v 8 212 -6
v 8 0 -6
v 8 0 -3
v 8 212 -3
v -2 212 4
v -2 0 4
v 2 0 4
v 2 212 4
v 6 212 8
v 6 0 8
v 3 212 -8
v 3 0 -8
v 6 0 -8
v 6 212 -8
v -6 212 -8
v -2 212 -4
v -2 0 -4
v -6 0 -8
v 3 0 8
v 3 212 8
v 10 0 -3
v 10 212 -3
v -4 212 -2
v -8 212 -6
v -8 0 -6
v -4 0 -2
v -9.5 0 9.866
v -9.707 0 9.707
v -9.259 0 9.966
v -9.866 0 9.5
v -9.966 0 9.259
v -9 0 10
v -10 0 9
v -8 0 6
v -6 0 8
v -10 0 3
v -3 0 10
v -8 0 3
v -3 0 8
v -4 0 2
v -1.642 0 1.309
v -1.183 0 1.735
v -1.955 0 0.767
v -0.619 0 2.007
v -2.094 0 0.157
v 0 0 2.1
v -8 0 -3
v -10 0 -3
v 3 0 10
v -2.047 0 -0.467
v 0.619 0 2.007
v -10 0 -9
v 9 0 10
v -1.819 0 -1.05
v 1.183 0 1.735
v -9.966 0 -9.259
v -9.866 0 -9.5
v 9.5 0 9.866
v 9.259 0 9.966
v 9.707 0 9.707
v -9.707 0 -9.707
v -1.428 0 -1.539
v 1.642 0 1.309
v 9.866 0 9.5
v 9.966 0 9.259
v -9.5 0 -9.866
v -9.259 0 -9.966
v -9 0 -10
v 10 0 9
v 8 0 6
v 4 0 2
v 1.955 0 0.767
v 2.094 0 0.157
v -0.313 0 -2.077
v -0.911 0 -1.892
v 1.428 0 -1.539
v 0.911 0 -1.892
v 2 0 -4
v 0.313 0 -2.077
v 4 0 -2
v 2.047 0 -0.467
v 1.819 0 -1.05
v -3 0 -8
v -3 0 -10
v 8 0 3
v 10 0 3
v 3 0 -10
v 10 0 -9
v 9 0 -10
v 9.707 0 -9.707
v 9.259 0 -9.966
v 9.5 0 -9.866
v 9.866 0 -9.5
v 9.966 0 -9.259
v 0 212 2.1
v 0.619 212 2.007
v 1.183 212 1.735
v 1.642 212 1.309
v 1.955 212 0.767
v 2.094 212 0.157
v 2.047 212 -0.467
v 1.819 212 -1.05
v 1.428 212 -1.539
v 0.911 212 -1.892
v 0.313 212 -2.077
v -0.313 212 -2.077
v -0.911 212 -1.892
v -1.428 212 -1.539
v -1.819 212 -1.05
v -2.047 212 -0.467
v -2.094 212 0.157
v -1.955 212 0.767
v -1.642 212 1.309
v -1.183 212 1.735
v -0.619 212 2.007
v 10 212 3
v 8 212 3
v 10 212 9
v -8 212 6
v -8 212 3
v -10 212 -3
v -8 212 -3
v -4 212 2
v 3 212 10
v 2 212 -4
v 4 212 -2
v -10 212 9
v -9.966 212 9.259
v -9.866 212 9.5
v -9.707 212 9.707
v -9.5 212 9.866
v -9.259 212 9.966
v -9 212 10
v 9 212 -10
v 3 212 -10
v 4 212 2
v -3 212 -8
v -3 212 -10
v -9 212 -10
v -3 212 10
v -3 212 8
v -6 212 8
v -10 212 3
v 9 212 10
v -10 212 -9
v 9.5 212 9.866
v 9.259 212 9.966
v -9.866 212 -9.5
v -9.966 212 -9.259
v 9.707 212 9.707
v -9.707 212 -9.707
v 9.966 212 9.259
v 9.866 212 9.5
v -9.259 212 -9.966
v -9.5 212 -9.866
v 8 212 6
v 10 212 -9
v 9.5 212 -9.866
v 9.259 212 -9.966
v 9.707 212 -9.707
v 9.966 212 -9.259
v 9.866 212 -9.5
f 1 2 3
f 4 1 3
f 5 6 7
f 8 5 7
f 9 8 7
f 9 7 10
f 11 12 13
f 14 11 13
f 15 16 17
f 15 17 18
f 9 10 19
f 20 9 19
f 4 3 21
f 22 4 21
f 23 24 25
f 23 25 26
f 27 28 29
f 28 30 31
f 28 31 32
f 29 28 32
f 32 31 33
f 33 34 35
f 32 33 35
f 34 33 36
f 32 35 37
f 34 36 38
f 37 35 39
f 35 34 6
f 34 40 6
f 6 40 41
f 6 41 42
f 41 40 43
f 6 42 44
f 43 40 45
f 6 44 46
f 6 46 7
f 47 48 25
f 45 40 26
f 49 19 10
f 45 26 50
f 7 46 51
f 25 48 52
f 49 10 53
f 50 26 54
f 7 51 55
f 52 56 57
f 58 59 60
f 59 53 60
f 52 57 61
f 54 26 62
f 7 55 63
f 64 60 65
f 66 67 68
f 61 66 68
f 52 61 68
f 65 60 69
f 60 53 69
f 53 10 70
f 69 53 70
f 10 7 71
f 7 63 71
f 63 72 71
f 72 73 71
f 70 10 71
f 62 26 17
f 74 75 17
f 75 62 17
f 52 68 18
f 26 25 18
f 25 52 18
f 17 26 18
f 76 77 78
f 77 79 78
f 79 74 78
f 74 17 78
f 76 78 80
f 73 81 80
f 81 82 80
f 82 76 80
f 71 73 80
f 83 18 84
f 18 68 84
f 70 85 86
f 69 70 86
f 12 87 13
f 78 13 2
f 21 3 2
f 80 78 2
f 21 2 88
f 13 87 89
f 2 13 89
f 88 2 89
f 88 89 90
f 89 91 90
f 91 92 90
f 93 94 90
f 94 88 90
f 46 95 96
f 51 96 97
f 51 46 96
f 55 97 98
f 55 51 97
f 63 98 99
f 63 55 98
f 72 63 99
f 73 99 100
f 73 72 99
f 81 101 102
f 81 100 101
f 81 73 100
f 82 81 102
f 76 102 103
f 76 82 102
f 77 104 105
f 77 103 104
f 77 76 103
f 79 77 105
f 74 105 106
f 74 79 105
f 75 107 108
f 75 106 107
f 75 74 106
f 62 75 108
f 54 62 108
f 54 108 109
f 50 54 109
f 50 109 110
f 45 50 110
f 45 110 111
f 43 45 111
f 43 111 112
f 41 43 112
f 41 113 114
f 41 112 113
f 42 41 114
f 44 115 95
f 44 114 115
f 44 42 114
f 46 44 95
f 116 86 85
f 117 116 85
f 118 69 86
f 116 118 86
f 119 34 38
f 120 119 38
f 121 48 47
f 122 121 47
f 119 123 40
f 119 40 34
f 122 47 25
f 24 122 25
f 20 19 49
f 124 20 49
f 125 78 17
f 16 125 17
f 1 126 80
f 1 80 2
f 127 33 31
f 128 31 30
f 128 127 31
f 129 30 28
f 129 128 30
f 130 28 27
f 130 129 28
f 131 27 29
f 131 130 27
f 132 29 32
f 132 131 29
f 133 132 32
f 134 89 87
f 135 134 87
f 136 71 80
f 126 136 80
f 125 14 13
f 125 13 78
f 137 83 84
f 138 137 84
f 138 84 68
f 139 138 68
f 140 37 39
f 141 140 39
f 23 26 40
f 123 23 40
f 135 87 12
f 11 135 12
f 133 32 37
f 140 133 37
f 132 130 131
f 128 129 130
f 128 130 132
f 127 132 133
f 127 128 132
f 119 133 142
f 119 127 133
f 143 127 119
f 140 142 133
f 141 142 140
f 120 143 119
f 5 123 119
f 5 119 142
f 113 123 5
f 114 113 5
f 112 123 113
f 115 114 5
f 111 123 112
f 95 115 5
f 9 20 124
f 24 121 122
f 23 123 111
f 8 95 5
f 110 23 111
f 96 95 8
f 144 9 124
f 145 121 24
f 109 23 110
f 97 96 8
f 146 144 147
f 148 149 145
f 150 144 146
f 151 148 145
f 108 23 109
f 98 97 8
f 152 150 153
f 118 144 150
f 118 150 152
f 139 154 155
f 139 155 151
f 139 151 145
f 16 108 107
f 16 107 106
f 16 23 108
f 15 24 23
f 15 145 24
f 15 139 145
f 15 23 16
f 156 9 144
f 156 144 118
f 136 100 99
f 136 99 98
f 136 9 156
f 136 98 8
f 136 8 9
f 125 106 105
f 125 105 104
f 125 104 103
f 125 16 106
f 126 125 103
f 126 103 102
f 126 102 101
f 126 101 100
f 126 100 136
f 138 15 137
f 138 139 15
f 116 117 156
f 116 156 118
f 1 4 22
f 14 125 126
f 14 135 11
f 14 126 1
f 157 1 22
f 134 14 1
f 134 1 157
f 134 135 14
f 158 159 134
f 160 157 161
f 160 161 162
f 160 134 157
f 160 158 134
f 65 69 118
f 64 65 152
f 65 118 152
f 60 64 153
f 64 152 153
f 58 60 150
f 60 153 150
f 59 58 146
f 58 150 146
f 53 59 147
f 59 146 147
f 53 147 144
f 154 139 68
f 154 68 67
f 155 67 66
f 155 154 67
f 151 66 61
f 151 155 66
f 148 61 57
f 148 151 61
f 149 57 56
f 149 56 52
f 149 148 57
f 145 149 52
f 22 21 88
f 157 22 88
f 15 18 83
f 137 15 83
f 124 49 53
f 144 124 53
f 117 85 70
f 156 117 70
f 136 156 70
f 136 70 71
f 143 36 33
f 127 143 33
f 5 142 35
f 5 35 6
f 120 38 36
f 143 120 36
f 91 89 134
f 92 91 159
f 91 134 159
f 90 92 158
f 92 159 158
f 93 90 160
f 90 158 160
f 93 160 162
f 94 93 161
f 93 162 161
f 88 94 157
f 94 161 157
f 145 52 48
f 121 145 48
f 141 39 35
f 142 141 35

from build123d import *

# Parameters (mm, degrees)
SKETCH_1_R          = 2.1
EXTRUDE_1_DEPTH     = 650
FILLET_1_R          = 1
SKETCH_4_W          = 20.710237558
SKETCH_4_H          = 20.933829866
CUT_EXTRUDE_1_DEPTH = 438


with BuildPart() as part:
    # 草图1 → 凸台-拉伸1 (new body)
    with BuildSketch(Plane(origin=(0, 0, 0), x_dir=(1, 0, 0), z_dir=(0, 1, 0))):
        Polygon((10, 10), (3, 10), (3, 8), (6, 8), (2, 4), (-2, 4), (-6, 8), (-3, 8), (-3, 10), (-10, 10), (-10, 3), (-8, 3), (-8, 6), (-4, 2), (-4, -2), (-8, -6), (-8, -3), (-10, -3), (-10, -10), (-3, -10), (-3, -8), (-6, -8), (-2, -4), (2, -4), (6, -8), (3, -8), (3, -10), (10, -10), (10, -3), (8, -3), (8, -6), (4, -2), (4, 2), (8, 6), (8, 3), (10, 3), align=None)
        with Locations(Location((0, 0, 0), (0, 0, 270))):
            Circle(SKETCH_1_R, mode=Mode.SUBTRACT)
    extrude(amount=EXTRUDE_1_DEPTH)

    # 圆角1
    fillet_1_edges = [part.edges().sort_by_distance(p)[0] for p in [
        (10, 325, 10),
        (-10, 325, 10),
        (-10, 325, -10),
        (10, 325, -10),
    ]]
    fillet(fillet_1_edges, radius=FILLET_1_R)

    # 草图4 → 切除-拉伸1 (cut)
    with BuildSketch(Plane(origin=(0, 650, 0), x_dir=(1, 0, 0), z_dir=(0, 1, 0))):
        Rectangle(SKETCH_4_W, SKETCH_4_H)
    extrude(amount=-CUT_EXTRUDE_1_DEPTH, mode=Mode.SUBTRACT)


solid = part.part
